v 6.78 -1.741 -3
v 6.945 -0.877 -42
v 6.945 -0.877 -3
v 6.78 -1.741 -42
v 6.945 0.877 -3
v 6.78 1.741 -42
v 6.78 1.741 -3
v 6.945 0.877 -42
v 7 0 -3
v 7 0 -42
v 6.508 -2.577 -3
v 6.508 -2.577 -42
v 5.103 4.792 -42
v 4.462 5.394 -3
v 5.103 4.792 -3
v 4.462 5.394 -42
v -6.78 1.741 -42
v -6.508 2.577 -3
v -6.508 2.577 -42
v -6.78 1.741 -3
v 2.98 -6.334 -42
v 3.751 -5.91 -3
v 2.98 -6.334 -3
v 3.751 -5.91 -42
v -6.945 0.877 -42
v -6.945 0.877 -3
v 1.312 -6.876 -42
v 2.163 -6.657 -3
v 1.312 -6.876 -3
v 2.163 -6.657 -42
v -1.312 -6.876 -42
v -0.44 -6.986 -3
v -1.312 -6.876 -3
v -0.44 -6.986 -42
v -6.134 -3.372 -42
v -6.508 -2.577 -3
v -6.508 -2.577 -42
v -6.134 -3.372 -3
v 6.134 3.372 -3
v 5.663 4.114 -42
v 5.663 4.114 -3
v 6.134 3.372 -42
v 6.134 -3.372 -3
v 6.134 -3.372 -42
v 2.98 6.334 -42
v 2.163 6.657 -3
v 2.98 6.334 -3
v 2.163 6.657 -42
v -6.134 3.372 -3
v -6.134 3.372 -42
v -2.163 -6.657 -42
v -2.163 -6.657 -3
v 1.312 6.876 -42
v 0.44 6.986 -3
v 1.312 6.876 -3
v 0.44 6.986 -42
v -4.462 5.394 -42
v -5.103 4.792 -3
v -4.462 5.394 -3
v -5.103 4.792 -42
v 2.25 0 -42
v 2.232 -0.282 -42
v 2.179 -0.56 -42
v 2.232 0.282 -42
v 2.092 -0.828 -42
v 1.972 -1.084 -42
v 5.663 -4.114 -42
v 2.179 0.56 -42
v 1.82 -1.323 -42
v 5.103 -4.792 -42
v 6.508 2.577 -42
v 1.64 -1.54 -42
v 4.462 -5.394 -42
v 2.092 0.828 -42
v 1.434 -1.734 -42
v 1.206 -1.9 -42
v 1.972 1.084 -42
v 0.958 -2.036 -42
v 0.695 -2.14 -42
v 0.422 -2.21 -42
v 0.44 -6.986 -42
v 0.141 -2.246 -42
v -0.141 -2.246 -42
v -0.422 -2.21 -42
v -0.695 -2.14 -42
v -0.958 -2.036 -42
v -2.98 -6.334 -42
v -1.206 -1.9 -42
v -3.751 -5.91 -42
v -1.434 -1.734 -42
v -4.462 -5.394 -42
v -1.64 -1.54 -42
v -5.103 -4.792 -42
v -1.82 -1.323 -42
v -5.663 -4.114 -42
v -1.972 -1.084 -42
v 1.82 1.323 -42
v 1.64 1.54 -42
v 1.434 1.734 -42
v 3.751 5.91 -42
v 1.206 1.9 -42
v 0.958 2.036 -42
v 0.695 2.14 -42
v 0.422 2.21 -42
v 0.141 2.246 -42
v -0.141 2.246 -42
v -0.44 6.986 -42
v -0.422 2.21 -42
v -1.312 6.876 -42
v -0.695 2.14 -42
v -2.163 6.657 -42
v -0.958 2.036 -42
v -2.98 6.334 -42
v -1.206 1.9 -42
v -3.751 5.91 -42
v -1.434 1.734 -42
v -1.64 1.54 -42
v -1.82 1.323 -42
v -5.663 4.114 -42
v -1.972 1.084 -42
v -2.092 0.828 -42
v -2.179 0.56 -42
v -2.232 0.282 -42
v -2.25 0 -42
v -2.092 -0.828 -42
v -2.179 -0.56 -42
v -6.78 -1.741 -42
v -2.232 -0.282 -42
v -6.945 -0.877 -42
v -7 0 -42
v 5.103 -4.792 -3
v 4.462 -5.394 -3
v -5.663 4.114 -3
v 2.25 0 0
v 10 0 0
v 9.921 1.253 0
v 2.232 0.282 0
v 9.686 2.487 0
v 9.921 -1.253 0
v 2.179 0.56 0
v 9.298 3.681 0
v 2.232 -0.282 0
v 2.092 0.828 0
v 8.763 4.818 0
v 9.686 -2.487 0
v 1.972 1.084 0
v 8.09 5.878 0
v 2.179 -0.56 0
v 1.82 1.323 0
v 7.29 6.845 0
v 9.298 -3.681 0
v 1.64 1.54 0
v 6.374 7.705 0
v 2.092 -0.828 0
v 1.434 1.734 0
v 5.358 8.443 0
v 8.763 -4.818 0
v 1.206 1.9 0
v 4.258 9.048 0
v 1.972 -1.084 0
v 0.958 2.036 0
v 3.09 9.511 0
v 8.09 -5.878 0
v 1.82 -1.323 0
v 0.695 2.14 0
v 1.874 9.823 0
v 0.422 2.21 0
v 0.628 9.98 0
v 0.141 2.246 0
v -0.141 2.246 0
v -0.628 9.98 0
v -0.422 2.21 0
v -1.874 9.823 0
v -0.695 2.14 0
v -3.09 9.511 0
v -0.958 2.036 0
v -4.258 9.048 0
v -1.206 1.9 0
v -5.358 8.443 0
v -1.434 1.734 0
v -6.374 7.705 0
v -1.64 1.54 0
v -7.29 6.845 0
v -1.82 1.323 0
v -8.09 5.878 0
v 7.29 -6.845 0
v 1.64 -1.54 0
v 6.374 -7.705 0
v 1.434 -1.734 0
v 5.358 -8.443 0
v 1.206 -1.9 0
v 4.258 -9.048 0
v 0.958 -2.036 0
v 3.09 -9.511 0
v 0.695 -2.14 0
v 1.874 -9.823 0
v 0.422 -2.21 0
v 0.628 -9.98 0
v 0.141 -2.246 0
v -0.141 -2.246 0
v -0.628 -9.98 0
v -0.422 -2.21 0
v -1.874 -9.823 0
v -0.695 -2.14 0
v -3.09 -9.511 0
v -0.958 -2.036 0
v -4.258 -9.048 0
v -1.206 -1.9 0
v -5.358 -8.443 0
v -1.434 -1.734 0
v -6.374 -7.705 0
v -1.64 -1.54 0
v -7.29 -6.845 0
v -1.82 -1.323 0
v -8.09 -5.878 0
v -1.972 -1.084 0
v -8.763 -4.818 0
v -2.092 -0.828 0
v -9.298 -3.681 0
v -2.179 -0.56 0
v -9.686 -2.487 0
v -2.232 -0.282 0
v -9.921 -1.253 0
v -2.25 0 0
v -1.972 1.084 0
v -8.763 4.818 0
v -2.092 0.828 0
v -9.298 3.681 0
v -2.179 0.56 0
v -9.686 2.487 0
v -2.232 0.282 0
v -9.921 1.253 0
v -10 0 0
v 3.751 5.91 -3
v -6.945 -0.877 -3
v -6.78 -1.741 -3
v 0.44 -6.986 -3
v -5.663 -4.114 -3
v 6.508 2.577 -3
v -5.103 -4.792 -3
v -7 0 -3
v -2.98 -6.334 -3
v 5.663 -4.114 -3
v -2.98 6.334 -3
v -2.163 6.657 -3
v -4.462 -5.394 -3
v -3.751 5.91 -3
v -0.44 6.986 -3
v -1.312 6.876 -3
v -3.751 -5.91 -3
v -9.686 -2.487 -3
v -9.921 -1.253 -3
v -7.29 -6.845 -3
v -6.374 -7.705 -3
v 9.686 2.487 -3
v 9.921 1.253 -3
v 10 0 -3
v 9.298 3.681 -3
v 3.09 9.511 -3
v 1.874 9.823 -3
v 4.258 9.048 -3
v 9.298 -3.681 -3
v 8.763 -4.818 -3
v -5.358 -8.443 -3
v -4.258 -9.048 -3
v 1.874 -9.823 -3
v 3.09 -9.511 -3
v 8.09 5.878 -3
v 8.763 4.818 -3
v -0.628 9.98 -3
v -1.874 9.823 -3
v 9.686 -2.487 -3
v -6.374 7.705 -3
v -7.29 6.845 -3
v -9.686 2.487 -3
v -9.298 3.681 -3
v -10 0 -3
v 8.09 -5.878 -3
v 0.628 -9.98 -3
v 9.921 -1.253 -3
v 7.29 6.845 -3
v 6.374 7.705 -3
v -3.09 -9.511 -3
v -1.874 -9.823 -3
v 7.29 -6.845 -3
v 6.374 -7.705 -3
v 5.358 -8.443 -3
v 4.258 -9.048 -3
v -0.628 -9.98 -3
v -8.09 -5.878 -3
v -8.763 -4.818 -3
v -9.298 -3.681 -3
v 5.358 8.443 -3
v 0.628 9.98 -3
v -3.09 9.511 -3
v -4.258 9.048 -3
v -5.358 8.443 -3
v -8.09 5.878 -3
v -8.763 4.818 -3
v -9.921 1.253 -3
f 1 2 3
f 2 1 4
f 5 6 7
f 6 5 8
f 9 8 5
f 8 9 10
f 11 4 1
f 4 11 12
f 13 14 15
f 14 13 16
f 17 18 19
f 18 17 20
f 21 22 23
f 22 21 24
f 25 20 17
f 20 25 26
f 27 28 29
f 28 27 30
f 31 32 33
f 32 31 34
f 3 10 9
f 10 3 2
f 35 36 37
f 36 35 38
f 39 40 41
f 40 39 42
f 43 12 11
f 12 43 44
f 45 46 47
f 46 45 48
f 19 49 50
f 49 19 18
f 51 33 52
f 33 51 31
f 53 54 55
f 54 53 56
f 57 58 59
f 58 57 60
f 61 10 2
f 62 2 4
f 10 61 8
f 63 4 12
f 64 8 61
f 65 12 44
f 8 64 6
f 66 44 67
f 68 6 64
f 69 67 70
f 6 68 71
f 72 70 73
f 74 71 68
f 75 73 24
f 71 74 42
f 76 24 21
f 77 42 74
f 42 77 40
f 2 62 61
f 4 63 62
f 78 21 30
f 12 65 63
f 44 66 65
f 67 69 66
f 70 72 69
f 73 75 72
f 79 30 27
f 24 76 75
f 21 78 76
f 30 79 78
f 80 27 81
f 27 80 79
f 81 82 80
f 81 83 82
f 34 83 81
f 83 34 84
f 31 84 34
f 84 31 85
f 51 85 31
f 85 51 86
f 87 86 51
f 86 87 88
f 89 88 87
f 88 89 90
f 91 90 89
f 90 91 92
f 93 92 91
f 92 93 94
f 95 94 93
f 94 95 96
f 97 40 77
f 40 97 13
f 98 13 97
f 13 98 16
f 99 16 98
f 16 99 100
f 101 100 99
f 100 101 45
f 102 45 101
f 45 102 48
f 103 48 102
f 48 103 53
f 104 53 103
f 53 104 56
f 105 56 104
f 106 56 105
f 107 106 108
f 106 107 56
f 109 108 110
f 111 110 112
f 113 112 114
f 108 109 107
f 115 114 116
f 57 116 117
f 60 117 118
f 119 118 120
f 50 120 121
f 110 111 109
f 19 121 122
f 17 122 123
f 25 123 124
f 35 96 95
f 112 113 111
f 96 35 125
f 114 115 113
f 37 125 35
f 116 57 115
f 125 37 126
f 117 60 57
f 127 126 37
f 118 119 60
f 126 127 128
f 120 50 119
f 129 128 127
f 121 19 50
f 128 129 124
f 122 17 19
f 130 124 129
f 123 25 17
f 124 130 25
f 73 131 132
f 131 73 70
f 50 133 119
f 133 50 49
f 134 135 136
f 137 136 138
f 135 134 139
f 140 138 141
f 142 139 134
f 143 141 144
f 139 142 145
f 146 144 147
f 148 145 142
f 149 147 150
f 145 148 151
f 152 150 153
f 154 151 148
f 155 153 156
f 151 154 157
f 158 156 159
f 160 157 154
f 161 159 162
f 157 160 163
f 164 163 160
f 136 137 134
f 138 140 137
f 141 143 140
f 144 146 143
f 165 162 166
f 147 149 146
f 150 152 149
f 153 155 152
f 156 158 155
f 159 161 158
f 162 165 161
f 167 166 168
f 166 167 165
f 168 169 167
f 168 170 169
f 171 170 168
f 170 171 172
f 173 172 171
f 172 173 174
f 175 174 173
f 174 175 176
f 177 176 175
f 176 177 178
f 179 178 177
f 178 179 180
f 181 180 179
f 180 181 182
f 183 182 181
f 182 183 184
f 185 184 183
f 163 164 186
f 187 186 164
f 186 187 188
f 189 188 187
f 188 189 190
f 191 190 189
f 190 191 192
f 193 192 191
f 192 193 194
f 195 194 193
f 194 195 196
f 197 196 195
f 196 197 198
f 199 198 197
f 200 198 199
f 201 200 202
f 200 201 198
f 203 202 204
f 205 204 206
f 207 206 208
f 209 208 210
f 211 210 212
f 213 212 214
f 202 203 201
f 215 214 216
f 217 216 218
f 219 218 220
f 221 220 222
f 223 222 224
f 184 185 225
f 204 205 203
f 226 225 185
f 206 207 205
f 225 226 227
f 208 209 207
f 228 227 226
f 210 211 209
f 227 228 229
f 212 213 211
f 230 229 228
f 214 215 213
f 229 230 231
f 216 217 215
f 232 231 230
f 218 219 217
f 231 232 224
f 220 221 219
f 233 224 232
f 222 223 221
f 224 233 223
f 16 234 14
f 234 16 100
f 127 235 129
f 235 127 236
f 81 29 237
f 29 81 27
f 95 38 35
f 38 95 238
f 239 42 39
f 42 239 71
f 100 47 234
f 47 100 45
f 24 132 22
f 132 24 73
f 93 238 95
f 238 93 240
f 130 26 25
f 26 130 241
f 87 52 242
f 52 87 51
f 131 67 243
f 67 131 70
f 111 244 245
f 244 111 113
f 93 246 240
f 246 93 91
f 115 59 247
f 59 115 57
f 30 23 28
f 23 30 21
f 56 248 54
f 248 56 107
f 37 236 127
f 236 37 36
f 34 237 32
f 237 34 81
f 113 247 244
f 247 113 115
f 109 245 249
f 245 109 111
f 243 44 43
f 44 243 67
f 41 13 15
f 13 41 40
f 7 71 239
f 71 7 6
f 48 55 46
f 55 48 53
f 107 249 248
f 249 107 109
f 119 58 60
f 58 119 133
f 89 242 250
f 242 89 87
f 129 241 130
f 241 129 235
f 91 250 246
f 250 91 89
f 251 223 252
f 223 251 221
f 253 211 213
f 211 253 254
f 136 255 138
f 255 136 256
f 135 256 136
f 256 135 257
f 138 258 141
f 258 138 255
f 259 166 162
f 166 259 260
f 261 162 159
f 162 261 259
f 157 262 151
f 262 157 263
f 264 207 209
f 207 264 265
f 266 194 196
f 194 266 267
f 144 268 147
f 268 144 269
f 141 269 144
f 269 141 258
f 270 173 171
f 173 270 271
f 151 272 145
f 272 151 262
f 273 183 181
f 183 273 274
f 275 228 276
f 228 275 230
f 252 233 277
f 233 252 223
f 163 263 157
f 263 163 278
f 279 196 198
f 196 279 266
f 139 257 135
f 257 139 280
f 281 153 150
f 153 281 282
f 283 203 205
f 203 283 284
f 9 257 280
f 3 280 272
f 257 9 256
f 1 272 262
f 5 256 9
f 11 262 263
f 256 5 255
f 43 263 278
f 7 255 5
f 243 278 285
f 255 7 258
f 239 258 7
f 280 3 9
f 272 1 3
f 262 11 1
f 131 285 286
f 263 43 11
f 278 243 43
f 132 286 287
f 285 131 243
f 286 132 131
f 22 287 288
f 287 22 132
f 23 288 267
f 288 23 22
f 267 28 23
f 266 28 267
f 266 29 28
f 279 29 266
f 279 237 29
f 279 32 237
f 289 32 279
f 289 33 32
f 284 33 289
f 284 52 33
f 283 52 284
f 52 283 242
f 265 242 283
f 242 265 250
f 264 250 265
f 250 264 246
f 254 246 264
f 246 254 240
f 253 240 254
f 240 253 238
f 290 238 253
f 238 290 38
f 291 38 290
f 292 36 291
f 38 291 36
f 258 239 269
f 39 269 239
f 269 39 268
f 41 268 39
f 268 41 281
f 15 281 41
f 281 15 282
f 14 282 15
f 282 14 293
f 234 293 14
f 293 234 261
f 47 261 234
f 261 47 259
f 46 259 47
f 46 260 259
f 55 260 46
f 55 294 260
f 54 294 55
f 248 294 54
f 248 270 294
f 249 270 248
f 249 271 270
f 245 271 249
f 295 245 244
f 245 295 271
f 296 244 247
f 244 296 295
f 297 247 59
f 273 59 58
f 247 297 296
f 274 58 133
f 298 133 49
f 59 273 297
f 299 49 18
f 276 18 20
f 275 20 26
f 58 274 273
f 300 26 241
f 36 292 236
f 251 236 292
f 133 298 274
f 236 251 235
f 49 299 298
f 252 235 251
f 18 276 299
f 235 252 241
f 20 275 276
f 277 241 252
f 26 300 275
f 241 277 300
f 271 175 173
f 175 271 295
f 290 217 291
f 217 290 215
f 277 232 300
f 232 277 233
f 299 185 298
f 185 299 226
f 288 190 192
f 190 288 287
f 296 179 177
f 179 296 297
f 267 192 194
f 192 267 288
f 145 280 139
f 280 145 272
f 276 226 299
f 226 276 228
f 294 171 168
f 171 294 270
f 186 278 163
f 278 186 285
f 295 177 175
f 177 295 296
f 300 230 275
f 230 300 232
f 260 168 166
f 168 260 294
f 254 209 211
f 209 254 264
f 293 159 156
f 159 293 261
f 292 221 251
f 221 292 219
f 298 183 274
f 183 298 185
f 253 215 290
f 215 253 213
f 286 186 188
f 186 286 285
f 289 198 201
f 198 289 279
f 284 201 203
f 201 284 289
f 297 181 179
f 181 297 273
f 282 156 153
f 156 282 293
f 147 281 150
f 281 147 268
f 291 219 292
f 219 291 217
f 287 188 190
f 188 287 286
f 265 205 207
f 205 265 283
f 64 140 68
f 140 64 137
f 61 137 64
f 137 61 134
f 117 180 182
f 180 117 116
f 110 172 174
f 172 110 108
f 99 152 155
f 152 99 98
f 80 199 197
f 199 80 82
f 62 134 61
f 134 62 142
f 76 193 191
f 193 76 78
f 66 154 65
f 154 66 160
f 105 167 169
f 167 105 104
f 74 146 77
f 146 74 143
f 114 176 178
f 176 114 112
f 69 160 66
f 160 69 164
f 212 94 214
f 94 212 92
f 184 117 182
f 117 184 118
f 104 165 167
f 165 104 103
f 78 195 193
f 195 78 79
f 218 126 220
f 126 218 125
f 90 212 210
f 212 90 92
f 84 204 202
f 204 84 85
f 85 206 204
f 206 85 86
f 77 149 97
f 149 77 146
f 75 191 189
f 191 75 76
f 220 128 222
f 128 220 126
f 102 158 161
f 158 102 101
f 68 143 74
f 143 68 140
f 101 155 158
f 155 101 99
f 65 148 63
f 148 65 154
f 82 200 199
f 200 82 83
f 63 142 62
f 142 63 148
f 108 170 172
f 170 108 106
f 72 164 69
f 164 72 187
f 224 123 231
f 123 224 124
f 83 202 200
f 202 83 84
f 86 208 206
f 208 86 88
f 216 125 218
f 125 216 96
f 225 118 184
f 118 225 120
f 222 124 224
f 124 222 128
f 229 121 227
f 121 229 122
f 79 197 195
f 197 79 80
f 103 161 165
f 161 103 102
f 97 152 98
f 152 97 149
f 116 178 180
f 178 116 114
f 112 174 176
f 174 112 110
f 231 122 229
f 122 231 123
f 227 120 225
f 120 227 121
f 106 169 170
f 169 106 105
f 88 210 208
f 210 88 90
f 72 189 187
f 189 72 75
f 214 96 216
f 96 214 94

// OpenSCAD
$fn = 50;


difference() {
	union() {
		translate(v = [0, 0, -42.0000000000]) {
			cylinder(h = 42, r = 7.0000000000);
		}
		translate(v = [0, 0, -3.0000000000]) {
			cylinder(h = 3, r = 10.0000000000);
		}
	}
	union() {
		#translate(v = [0, 0, -42]) {
			cylinder(h = 42, r = 2.2500000000);
		}
	}
}
